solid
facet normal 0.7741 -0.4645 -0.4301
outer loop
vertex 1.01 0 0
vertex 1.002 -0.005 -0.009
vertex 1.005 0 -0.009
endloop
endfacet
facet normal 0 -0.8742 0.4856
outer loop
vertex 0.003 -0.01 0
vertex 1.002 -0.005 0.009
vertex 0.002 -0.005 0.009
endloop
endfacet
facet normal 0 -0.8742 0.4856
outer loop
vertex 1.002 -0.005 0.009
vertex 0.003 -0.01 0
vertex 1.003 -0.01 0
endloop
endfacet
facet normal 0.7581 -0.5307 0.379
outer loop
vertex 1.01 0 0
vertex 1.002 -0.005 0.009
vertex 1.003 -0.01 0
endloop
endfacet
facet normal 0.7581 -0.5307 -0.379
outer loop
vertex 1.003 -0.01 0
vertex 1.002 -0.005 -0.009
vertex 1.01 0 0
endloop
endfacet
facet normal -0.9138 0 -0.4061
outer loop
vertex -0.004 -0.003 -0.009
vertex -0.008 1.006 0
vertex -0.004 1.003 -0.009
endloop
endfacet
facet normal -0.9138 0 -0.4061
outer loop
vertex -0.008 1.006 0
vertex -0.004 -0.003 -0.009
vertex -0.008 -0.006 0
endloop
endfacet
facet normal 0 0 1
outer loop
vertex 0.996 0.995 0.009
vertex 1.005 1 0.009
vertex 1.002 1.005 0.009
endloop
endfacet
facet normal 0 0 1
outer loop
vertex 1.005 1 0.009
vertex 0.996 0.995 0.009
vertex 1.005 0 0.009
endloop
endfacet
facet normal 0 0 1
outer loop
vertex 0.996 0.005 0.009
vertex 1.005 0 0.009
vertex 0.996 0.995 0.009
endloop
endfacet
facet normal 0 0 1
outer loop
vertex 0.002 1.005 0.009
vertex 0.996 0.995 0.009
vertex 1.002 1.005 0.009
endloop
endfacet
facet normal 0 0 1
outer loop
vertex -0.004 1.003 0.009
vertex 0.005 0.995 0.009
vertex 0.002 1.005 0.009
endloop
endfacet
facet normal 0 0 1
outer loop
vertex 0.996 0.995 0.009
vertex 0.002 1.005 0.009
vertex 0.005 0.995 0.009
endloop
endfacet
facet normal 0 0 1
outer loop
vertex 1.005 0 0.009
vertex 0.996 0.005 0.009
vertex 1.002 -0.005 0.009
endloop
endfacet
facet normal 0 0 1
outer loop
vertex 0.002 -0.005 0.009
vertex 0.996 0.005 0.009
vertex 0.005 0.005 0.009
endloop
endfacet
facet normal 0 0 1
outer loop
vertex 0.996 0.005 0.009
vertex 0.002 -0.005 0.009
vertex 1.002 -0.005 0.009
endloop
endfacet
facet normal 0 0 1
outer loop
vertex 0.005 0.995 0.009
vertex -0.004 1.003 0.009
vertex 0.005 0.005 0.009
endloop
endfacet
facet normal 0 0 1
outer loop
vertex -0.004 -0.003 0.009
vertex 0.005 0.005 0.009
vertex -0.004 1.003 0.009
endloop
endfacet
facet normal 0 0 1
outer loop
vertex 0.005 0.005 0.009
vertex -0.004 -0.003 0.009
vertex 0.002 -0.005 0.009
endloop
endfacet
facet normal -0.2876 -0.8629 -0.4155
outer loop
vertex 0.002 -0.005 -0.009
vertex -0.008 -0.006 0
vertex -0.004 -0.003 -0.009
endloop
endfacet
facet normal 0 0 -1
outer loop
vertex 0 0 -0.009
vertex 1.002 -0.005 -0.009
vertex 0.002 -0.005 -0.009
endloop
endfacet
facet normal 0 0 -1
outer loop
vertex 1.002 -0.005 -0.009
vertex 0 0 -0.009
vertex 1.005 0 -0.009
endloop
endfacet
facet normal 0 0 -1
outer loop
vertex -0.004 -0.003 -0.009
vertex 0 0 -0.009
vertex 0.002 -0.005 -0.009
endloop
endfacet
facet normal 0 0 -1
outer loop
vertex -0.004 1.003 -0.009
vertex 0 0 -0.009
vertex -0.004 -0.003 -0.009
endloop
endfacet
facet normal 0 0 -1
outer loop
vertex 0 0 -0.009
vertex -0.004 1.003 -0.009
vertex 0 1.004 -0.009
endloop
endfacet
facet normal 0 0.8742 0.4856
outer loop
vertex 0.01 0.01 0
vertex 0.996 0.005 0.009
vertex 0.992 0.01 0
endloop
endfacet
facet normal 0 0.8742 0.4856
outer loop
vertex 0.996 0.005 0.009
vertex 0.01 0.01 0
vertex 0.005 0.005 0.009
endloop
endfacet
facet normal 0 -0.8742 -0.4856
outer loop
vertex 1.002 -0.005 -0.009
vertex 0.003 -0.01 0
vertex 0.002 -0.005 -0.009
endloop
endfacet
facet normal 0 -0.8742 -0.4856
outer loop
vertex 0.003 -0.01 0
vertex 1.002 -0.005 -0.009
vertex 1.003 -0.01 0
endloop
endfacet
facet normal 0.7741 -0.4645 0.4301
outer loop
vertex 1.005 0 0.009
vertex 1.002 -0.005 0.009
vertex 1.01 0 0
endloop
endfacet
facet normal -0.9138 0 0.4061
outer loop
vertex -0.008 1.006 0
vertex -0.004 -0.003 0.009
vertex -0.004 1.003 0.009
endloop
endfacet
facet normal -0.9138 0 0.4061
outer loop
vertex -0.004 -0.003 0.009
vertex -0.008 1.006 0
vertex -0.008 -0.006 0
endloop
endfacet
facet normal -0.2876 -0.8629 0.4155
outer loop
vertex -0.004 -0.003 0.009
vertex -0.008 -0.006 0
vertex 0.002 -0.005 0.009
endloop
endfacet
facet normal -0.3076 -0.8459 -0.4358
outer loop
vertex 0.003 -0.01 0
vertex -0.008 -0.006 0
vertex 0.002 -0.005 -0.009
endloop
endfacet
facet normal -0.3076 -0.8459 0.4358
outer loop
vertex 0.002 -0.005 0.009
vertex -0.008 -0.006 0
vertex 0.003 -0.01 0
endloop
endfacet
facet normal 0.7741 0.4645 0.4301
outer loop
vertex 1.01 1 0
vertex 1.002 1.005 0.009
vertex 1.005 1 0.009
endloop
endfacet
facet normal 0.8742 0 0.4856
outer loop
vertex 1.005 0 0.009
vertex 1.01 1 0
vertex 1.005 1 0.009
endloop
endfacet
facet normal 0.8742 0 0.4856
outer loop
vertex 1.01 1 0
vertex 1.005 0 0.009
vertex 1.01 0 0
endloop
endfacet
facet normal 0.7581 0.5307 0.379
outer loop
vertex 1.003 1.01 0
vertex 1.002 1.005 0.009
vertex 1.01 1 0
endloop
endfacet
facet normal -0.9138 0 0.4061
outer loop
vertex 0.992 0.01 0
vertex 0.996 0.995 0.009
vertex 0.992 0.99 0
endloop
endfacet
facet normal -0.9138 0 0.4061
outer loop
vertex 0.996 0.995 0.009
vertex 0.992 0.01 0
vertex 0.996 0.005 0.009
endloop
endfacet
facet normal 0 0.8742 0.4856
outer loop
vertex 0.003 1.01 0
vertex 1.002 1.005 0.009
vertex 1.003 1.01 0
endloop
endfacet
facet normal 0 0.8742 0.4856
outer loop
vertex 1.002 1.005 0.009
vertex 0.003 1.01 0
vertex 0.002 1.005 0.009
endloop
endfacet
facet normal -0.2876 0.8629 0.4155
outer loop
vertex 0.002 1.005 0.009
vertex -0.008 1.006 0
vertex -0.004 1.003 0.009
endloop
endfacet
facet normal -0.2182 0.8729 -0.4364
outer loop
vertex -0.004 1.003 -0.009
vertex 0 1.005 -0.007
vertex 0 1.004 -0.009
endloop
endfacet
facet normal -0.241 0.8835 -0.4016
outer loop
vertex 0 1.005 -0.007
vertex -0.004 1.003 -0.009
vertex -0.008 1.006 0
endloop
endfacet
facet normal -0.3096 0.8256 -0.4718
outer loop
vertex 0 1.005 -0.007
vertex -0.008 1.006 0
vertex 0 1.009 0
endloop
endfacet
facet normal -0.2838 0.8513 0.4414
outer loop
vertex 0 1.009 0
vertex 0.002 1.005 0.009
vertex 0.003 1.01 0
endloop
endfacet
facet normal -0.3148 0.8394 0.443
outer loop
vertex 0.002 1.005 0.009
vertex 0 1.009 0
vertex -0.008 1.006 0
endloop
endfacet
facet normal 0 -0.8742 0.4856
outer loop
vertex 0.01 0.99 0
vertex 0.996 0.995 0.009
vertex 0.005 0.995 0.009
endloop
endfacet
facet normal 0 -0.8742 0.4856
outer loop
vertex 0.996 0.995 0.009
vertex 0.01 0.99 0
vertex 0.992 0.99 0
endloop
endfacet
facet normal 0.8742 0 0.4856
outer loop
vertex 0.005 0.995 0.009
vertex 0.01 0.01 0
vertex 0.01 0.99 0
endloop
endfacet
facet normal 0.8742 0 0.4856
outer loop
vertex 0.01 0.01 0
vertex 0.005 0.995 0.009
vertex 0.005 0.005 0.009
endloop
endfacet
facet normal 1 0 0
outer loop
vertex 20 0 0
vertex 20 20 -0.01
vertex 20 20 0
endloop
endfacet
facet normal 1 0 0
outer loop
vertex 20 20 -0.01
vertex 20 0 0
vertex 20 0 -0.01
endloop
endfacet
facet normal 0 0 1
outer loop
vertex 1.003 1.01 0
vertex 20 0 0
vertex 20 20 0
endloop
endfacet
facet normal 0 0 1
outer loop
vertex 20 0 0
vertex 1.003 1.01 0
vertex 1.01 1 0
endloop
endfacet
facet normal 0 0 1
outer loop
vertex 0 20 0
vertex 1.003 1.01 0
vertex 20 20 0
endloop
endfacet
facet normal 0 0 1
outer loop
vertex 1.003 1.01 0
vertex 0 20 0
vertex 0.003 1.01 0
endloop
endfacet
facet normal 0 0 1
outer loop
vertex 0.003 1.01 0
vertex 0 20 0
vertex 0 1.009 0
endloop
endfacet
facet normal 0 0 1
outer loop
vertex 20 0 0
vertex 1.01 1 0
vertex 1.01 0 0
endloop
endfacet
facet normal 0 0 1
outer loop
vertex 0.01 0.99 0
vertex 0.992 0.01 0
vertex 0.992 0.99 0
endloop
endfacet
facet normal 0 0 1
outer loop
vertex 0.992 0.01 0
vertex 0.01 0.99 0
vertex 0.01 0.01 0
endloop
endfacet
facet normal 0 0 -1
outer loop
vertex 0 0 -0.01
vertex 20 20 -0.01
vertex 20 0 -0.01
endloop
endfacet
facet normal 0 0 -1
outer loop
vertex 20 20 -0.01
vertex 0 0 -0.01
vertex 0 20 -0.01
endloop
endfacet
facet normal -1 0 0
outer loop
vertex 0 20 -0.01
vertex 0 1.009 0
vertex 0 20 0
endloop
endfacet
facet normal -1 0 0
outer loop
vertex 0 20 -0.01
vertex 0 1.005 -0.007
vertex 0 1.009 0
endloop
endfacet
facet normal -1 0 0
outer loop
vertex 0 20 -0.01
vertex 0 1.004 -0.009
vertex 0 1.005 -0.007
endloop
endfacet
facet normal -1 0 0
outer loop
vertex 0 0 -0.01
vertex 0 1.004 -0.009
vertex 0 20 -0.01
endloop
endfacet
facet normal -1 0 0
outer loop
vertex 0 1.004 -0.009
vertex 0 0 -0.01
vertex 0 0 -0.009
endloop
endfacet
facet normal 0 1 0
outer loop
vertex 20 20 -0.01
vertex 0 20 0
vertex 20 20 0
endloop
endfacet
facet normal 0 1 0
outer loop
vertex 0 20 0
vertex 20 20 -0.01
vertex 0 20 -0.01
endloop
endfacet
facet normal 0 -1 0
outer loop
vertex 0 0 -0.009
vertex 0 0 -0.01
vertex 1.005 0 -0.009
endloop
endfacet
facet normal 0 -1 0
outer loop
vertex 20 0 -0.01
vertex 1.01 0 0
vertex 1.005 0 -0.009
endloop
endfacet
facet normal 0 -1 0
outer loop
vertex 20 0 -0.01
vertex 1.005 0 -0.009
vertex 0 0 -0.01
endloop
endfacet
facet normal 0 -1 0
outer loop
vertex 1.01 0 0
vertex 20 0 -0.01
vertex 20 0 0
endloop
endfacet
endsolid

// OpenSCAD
hull(){
    translate([0.0, 0.0]) sphere(0.01);
    translate([1.0, 0.0]) sphere(0.01);
}
hull(){
    translate([1.0, 0.0]) sphere(0.01);
    translate([1.0, 1.0]) sphere(0.01);
}
hull(){
    translate([1.0, 1.0]) sphere(0.01);
    translate([0.0, 1.0]) sphere(0.01);
}
hull(){
    translate([0.0, 1.0]) sphere(0.01);
    translate([0.0, 0.0]) sphere(0.01);
}
translate([0,0,-0.01]) color([0.1,0.1,0.1]) cube([20,20,0.01]);
